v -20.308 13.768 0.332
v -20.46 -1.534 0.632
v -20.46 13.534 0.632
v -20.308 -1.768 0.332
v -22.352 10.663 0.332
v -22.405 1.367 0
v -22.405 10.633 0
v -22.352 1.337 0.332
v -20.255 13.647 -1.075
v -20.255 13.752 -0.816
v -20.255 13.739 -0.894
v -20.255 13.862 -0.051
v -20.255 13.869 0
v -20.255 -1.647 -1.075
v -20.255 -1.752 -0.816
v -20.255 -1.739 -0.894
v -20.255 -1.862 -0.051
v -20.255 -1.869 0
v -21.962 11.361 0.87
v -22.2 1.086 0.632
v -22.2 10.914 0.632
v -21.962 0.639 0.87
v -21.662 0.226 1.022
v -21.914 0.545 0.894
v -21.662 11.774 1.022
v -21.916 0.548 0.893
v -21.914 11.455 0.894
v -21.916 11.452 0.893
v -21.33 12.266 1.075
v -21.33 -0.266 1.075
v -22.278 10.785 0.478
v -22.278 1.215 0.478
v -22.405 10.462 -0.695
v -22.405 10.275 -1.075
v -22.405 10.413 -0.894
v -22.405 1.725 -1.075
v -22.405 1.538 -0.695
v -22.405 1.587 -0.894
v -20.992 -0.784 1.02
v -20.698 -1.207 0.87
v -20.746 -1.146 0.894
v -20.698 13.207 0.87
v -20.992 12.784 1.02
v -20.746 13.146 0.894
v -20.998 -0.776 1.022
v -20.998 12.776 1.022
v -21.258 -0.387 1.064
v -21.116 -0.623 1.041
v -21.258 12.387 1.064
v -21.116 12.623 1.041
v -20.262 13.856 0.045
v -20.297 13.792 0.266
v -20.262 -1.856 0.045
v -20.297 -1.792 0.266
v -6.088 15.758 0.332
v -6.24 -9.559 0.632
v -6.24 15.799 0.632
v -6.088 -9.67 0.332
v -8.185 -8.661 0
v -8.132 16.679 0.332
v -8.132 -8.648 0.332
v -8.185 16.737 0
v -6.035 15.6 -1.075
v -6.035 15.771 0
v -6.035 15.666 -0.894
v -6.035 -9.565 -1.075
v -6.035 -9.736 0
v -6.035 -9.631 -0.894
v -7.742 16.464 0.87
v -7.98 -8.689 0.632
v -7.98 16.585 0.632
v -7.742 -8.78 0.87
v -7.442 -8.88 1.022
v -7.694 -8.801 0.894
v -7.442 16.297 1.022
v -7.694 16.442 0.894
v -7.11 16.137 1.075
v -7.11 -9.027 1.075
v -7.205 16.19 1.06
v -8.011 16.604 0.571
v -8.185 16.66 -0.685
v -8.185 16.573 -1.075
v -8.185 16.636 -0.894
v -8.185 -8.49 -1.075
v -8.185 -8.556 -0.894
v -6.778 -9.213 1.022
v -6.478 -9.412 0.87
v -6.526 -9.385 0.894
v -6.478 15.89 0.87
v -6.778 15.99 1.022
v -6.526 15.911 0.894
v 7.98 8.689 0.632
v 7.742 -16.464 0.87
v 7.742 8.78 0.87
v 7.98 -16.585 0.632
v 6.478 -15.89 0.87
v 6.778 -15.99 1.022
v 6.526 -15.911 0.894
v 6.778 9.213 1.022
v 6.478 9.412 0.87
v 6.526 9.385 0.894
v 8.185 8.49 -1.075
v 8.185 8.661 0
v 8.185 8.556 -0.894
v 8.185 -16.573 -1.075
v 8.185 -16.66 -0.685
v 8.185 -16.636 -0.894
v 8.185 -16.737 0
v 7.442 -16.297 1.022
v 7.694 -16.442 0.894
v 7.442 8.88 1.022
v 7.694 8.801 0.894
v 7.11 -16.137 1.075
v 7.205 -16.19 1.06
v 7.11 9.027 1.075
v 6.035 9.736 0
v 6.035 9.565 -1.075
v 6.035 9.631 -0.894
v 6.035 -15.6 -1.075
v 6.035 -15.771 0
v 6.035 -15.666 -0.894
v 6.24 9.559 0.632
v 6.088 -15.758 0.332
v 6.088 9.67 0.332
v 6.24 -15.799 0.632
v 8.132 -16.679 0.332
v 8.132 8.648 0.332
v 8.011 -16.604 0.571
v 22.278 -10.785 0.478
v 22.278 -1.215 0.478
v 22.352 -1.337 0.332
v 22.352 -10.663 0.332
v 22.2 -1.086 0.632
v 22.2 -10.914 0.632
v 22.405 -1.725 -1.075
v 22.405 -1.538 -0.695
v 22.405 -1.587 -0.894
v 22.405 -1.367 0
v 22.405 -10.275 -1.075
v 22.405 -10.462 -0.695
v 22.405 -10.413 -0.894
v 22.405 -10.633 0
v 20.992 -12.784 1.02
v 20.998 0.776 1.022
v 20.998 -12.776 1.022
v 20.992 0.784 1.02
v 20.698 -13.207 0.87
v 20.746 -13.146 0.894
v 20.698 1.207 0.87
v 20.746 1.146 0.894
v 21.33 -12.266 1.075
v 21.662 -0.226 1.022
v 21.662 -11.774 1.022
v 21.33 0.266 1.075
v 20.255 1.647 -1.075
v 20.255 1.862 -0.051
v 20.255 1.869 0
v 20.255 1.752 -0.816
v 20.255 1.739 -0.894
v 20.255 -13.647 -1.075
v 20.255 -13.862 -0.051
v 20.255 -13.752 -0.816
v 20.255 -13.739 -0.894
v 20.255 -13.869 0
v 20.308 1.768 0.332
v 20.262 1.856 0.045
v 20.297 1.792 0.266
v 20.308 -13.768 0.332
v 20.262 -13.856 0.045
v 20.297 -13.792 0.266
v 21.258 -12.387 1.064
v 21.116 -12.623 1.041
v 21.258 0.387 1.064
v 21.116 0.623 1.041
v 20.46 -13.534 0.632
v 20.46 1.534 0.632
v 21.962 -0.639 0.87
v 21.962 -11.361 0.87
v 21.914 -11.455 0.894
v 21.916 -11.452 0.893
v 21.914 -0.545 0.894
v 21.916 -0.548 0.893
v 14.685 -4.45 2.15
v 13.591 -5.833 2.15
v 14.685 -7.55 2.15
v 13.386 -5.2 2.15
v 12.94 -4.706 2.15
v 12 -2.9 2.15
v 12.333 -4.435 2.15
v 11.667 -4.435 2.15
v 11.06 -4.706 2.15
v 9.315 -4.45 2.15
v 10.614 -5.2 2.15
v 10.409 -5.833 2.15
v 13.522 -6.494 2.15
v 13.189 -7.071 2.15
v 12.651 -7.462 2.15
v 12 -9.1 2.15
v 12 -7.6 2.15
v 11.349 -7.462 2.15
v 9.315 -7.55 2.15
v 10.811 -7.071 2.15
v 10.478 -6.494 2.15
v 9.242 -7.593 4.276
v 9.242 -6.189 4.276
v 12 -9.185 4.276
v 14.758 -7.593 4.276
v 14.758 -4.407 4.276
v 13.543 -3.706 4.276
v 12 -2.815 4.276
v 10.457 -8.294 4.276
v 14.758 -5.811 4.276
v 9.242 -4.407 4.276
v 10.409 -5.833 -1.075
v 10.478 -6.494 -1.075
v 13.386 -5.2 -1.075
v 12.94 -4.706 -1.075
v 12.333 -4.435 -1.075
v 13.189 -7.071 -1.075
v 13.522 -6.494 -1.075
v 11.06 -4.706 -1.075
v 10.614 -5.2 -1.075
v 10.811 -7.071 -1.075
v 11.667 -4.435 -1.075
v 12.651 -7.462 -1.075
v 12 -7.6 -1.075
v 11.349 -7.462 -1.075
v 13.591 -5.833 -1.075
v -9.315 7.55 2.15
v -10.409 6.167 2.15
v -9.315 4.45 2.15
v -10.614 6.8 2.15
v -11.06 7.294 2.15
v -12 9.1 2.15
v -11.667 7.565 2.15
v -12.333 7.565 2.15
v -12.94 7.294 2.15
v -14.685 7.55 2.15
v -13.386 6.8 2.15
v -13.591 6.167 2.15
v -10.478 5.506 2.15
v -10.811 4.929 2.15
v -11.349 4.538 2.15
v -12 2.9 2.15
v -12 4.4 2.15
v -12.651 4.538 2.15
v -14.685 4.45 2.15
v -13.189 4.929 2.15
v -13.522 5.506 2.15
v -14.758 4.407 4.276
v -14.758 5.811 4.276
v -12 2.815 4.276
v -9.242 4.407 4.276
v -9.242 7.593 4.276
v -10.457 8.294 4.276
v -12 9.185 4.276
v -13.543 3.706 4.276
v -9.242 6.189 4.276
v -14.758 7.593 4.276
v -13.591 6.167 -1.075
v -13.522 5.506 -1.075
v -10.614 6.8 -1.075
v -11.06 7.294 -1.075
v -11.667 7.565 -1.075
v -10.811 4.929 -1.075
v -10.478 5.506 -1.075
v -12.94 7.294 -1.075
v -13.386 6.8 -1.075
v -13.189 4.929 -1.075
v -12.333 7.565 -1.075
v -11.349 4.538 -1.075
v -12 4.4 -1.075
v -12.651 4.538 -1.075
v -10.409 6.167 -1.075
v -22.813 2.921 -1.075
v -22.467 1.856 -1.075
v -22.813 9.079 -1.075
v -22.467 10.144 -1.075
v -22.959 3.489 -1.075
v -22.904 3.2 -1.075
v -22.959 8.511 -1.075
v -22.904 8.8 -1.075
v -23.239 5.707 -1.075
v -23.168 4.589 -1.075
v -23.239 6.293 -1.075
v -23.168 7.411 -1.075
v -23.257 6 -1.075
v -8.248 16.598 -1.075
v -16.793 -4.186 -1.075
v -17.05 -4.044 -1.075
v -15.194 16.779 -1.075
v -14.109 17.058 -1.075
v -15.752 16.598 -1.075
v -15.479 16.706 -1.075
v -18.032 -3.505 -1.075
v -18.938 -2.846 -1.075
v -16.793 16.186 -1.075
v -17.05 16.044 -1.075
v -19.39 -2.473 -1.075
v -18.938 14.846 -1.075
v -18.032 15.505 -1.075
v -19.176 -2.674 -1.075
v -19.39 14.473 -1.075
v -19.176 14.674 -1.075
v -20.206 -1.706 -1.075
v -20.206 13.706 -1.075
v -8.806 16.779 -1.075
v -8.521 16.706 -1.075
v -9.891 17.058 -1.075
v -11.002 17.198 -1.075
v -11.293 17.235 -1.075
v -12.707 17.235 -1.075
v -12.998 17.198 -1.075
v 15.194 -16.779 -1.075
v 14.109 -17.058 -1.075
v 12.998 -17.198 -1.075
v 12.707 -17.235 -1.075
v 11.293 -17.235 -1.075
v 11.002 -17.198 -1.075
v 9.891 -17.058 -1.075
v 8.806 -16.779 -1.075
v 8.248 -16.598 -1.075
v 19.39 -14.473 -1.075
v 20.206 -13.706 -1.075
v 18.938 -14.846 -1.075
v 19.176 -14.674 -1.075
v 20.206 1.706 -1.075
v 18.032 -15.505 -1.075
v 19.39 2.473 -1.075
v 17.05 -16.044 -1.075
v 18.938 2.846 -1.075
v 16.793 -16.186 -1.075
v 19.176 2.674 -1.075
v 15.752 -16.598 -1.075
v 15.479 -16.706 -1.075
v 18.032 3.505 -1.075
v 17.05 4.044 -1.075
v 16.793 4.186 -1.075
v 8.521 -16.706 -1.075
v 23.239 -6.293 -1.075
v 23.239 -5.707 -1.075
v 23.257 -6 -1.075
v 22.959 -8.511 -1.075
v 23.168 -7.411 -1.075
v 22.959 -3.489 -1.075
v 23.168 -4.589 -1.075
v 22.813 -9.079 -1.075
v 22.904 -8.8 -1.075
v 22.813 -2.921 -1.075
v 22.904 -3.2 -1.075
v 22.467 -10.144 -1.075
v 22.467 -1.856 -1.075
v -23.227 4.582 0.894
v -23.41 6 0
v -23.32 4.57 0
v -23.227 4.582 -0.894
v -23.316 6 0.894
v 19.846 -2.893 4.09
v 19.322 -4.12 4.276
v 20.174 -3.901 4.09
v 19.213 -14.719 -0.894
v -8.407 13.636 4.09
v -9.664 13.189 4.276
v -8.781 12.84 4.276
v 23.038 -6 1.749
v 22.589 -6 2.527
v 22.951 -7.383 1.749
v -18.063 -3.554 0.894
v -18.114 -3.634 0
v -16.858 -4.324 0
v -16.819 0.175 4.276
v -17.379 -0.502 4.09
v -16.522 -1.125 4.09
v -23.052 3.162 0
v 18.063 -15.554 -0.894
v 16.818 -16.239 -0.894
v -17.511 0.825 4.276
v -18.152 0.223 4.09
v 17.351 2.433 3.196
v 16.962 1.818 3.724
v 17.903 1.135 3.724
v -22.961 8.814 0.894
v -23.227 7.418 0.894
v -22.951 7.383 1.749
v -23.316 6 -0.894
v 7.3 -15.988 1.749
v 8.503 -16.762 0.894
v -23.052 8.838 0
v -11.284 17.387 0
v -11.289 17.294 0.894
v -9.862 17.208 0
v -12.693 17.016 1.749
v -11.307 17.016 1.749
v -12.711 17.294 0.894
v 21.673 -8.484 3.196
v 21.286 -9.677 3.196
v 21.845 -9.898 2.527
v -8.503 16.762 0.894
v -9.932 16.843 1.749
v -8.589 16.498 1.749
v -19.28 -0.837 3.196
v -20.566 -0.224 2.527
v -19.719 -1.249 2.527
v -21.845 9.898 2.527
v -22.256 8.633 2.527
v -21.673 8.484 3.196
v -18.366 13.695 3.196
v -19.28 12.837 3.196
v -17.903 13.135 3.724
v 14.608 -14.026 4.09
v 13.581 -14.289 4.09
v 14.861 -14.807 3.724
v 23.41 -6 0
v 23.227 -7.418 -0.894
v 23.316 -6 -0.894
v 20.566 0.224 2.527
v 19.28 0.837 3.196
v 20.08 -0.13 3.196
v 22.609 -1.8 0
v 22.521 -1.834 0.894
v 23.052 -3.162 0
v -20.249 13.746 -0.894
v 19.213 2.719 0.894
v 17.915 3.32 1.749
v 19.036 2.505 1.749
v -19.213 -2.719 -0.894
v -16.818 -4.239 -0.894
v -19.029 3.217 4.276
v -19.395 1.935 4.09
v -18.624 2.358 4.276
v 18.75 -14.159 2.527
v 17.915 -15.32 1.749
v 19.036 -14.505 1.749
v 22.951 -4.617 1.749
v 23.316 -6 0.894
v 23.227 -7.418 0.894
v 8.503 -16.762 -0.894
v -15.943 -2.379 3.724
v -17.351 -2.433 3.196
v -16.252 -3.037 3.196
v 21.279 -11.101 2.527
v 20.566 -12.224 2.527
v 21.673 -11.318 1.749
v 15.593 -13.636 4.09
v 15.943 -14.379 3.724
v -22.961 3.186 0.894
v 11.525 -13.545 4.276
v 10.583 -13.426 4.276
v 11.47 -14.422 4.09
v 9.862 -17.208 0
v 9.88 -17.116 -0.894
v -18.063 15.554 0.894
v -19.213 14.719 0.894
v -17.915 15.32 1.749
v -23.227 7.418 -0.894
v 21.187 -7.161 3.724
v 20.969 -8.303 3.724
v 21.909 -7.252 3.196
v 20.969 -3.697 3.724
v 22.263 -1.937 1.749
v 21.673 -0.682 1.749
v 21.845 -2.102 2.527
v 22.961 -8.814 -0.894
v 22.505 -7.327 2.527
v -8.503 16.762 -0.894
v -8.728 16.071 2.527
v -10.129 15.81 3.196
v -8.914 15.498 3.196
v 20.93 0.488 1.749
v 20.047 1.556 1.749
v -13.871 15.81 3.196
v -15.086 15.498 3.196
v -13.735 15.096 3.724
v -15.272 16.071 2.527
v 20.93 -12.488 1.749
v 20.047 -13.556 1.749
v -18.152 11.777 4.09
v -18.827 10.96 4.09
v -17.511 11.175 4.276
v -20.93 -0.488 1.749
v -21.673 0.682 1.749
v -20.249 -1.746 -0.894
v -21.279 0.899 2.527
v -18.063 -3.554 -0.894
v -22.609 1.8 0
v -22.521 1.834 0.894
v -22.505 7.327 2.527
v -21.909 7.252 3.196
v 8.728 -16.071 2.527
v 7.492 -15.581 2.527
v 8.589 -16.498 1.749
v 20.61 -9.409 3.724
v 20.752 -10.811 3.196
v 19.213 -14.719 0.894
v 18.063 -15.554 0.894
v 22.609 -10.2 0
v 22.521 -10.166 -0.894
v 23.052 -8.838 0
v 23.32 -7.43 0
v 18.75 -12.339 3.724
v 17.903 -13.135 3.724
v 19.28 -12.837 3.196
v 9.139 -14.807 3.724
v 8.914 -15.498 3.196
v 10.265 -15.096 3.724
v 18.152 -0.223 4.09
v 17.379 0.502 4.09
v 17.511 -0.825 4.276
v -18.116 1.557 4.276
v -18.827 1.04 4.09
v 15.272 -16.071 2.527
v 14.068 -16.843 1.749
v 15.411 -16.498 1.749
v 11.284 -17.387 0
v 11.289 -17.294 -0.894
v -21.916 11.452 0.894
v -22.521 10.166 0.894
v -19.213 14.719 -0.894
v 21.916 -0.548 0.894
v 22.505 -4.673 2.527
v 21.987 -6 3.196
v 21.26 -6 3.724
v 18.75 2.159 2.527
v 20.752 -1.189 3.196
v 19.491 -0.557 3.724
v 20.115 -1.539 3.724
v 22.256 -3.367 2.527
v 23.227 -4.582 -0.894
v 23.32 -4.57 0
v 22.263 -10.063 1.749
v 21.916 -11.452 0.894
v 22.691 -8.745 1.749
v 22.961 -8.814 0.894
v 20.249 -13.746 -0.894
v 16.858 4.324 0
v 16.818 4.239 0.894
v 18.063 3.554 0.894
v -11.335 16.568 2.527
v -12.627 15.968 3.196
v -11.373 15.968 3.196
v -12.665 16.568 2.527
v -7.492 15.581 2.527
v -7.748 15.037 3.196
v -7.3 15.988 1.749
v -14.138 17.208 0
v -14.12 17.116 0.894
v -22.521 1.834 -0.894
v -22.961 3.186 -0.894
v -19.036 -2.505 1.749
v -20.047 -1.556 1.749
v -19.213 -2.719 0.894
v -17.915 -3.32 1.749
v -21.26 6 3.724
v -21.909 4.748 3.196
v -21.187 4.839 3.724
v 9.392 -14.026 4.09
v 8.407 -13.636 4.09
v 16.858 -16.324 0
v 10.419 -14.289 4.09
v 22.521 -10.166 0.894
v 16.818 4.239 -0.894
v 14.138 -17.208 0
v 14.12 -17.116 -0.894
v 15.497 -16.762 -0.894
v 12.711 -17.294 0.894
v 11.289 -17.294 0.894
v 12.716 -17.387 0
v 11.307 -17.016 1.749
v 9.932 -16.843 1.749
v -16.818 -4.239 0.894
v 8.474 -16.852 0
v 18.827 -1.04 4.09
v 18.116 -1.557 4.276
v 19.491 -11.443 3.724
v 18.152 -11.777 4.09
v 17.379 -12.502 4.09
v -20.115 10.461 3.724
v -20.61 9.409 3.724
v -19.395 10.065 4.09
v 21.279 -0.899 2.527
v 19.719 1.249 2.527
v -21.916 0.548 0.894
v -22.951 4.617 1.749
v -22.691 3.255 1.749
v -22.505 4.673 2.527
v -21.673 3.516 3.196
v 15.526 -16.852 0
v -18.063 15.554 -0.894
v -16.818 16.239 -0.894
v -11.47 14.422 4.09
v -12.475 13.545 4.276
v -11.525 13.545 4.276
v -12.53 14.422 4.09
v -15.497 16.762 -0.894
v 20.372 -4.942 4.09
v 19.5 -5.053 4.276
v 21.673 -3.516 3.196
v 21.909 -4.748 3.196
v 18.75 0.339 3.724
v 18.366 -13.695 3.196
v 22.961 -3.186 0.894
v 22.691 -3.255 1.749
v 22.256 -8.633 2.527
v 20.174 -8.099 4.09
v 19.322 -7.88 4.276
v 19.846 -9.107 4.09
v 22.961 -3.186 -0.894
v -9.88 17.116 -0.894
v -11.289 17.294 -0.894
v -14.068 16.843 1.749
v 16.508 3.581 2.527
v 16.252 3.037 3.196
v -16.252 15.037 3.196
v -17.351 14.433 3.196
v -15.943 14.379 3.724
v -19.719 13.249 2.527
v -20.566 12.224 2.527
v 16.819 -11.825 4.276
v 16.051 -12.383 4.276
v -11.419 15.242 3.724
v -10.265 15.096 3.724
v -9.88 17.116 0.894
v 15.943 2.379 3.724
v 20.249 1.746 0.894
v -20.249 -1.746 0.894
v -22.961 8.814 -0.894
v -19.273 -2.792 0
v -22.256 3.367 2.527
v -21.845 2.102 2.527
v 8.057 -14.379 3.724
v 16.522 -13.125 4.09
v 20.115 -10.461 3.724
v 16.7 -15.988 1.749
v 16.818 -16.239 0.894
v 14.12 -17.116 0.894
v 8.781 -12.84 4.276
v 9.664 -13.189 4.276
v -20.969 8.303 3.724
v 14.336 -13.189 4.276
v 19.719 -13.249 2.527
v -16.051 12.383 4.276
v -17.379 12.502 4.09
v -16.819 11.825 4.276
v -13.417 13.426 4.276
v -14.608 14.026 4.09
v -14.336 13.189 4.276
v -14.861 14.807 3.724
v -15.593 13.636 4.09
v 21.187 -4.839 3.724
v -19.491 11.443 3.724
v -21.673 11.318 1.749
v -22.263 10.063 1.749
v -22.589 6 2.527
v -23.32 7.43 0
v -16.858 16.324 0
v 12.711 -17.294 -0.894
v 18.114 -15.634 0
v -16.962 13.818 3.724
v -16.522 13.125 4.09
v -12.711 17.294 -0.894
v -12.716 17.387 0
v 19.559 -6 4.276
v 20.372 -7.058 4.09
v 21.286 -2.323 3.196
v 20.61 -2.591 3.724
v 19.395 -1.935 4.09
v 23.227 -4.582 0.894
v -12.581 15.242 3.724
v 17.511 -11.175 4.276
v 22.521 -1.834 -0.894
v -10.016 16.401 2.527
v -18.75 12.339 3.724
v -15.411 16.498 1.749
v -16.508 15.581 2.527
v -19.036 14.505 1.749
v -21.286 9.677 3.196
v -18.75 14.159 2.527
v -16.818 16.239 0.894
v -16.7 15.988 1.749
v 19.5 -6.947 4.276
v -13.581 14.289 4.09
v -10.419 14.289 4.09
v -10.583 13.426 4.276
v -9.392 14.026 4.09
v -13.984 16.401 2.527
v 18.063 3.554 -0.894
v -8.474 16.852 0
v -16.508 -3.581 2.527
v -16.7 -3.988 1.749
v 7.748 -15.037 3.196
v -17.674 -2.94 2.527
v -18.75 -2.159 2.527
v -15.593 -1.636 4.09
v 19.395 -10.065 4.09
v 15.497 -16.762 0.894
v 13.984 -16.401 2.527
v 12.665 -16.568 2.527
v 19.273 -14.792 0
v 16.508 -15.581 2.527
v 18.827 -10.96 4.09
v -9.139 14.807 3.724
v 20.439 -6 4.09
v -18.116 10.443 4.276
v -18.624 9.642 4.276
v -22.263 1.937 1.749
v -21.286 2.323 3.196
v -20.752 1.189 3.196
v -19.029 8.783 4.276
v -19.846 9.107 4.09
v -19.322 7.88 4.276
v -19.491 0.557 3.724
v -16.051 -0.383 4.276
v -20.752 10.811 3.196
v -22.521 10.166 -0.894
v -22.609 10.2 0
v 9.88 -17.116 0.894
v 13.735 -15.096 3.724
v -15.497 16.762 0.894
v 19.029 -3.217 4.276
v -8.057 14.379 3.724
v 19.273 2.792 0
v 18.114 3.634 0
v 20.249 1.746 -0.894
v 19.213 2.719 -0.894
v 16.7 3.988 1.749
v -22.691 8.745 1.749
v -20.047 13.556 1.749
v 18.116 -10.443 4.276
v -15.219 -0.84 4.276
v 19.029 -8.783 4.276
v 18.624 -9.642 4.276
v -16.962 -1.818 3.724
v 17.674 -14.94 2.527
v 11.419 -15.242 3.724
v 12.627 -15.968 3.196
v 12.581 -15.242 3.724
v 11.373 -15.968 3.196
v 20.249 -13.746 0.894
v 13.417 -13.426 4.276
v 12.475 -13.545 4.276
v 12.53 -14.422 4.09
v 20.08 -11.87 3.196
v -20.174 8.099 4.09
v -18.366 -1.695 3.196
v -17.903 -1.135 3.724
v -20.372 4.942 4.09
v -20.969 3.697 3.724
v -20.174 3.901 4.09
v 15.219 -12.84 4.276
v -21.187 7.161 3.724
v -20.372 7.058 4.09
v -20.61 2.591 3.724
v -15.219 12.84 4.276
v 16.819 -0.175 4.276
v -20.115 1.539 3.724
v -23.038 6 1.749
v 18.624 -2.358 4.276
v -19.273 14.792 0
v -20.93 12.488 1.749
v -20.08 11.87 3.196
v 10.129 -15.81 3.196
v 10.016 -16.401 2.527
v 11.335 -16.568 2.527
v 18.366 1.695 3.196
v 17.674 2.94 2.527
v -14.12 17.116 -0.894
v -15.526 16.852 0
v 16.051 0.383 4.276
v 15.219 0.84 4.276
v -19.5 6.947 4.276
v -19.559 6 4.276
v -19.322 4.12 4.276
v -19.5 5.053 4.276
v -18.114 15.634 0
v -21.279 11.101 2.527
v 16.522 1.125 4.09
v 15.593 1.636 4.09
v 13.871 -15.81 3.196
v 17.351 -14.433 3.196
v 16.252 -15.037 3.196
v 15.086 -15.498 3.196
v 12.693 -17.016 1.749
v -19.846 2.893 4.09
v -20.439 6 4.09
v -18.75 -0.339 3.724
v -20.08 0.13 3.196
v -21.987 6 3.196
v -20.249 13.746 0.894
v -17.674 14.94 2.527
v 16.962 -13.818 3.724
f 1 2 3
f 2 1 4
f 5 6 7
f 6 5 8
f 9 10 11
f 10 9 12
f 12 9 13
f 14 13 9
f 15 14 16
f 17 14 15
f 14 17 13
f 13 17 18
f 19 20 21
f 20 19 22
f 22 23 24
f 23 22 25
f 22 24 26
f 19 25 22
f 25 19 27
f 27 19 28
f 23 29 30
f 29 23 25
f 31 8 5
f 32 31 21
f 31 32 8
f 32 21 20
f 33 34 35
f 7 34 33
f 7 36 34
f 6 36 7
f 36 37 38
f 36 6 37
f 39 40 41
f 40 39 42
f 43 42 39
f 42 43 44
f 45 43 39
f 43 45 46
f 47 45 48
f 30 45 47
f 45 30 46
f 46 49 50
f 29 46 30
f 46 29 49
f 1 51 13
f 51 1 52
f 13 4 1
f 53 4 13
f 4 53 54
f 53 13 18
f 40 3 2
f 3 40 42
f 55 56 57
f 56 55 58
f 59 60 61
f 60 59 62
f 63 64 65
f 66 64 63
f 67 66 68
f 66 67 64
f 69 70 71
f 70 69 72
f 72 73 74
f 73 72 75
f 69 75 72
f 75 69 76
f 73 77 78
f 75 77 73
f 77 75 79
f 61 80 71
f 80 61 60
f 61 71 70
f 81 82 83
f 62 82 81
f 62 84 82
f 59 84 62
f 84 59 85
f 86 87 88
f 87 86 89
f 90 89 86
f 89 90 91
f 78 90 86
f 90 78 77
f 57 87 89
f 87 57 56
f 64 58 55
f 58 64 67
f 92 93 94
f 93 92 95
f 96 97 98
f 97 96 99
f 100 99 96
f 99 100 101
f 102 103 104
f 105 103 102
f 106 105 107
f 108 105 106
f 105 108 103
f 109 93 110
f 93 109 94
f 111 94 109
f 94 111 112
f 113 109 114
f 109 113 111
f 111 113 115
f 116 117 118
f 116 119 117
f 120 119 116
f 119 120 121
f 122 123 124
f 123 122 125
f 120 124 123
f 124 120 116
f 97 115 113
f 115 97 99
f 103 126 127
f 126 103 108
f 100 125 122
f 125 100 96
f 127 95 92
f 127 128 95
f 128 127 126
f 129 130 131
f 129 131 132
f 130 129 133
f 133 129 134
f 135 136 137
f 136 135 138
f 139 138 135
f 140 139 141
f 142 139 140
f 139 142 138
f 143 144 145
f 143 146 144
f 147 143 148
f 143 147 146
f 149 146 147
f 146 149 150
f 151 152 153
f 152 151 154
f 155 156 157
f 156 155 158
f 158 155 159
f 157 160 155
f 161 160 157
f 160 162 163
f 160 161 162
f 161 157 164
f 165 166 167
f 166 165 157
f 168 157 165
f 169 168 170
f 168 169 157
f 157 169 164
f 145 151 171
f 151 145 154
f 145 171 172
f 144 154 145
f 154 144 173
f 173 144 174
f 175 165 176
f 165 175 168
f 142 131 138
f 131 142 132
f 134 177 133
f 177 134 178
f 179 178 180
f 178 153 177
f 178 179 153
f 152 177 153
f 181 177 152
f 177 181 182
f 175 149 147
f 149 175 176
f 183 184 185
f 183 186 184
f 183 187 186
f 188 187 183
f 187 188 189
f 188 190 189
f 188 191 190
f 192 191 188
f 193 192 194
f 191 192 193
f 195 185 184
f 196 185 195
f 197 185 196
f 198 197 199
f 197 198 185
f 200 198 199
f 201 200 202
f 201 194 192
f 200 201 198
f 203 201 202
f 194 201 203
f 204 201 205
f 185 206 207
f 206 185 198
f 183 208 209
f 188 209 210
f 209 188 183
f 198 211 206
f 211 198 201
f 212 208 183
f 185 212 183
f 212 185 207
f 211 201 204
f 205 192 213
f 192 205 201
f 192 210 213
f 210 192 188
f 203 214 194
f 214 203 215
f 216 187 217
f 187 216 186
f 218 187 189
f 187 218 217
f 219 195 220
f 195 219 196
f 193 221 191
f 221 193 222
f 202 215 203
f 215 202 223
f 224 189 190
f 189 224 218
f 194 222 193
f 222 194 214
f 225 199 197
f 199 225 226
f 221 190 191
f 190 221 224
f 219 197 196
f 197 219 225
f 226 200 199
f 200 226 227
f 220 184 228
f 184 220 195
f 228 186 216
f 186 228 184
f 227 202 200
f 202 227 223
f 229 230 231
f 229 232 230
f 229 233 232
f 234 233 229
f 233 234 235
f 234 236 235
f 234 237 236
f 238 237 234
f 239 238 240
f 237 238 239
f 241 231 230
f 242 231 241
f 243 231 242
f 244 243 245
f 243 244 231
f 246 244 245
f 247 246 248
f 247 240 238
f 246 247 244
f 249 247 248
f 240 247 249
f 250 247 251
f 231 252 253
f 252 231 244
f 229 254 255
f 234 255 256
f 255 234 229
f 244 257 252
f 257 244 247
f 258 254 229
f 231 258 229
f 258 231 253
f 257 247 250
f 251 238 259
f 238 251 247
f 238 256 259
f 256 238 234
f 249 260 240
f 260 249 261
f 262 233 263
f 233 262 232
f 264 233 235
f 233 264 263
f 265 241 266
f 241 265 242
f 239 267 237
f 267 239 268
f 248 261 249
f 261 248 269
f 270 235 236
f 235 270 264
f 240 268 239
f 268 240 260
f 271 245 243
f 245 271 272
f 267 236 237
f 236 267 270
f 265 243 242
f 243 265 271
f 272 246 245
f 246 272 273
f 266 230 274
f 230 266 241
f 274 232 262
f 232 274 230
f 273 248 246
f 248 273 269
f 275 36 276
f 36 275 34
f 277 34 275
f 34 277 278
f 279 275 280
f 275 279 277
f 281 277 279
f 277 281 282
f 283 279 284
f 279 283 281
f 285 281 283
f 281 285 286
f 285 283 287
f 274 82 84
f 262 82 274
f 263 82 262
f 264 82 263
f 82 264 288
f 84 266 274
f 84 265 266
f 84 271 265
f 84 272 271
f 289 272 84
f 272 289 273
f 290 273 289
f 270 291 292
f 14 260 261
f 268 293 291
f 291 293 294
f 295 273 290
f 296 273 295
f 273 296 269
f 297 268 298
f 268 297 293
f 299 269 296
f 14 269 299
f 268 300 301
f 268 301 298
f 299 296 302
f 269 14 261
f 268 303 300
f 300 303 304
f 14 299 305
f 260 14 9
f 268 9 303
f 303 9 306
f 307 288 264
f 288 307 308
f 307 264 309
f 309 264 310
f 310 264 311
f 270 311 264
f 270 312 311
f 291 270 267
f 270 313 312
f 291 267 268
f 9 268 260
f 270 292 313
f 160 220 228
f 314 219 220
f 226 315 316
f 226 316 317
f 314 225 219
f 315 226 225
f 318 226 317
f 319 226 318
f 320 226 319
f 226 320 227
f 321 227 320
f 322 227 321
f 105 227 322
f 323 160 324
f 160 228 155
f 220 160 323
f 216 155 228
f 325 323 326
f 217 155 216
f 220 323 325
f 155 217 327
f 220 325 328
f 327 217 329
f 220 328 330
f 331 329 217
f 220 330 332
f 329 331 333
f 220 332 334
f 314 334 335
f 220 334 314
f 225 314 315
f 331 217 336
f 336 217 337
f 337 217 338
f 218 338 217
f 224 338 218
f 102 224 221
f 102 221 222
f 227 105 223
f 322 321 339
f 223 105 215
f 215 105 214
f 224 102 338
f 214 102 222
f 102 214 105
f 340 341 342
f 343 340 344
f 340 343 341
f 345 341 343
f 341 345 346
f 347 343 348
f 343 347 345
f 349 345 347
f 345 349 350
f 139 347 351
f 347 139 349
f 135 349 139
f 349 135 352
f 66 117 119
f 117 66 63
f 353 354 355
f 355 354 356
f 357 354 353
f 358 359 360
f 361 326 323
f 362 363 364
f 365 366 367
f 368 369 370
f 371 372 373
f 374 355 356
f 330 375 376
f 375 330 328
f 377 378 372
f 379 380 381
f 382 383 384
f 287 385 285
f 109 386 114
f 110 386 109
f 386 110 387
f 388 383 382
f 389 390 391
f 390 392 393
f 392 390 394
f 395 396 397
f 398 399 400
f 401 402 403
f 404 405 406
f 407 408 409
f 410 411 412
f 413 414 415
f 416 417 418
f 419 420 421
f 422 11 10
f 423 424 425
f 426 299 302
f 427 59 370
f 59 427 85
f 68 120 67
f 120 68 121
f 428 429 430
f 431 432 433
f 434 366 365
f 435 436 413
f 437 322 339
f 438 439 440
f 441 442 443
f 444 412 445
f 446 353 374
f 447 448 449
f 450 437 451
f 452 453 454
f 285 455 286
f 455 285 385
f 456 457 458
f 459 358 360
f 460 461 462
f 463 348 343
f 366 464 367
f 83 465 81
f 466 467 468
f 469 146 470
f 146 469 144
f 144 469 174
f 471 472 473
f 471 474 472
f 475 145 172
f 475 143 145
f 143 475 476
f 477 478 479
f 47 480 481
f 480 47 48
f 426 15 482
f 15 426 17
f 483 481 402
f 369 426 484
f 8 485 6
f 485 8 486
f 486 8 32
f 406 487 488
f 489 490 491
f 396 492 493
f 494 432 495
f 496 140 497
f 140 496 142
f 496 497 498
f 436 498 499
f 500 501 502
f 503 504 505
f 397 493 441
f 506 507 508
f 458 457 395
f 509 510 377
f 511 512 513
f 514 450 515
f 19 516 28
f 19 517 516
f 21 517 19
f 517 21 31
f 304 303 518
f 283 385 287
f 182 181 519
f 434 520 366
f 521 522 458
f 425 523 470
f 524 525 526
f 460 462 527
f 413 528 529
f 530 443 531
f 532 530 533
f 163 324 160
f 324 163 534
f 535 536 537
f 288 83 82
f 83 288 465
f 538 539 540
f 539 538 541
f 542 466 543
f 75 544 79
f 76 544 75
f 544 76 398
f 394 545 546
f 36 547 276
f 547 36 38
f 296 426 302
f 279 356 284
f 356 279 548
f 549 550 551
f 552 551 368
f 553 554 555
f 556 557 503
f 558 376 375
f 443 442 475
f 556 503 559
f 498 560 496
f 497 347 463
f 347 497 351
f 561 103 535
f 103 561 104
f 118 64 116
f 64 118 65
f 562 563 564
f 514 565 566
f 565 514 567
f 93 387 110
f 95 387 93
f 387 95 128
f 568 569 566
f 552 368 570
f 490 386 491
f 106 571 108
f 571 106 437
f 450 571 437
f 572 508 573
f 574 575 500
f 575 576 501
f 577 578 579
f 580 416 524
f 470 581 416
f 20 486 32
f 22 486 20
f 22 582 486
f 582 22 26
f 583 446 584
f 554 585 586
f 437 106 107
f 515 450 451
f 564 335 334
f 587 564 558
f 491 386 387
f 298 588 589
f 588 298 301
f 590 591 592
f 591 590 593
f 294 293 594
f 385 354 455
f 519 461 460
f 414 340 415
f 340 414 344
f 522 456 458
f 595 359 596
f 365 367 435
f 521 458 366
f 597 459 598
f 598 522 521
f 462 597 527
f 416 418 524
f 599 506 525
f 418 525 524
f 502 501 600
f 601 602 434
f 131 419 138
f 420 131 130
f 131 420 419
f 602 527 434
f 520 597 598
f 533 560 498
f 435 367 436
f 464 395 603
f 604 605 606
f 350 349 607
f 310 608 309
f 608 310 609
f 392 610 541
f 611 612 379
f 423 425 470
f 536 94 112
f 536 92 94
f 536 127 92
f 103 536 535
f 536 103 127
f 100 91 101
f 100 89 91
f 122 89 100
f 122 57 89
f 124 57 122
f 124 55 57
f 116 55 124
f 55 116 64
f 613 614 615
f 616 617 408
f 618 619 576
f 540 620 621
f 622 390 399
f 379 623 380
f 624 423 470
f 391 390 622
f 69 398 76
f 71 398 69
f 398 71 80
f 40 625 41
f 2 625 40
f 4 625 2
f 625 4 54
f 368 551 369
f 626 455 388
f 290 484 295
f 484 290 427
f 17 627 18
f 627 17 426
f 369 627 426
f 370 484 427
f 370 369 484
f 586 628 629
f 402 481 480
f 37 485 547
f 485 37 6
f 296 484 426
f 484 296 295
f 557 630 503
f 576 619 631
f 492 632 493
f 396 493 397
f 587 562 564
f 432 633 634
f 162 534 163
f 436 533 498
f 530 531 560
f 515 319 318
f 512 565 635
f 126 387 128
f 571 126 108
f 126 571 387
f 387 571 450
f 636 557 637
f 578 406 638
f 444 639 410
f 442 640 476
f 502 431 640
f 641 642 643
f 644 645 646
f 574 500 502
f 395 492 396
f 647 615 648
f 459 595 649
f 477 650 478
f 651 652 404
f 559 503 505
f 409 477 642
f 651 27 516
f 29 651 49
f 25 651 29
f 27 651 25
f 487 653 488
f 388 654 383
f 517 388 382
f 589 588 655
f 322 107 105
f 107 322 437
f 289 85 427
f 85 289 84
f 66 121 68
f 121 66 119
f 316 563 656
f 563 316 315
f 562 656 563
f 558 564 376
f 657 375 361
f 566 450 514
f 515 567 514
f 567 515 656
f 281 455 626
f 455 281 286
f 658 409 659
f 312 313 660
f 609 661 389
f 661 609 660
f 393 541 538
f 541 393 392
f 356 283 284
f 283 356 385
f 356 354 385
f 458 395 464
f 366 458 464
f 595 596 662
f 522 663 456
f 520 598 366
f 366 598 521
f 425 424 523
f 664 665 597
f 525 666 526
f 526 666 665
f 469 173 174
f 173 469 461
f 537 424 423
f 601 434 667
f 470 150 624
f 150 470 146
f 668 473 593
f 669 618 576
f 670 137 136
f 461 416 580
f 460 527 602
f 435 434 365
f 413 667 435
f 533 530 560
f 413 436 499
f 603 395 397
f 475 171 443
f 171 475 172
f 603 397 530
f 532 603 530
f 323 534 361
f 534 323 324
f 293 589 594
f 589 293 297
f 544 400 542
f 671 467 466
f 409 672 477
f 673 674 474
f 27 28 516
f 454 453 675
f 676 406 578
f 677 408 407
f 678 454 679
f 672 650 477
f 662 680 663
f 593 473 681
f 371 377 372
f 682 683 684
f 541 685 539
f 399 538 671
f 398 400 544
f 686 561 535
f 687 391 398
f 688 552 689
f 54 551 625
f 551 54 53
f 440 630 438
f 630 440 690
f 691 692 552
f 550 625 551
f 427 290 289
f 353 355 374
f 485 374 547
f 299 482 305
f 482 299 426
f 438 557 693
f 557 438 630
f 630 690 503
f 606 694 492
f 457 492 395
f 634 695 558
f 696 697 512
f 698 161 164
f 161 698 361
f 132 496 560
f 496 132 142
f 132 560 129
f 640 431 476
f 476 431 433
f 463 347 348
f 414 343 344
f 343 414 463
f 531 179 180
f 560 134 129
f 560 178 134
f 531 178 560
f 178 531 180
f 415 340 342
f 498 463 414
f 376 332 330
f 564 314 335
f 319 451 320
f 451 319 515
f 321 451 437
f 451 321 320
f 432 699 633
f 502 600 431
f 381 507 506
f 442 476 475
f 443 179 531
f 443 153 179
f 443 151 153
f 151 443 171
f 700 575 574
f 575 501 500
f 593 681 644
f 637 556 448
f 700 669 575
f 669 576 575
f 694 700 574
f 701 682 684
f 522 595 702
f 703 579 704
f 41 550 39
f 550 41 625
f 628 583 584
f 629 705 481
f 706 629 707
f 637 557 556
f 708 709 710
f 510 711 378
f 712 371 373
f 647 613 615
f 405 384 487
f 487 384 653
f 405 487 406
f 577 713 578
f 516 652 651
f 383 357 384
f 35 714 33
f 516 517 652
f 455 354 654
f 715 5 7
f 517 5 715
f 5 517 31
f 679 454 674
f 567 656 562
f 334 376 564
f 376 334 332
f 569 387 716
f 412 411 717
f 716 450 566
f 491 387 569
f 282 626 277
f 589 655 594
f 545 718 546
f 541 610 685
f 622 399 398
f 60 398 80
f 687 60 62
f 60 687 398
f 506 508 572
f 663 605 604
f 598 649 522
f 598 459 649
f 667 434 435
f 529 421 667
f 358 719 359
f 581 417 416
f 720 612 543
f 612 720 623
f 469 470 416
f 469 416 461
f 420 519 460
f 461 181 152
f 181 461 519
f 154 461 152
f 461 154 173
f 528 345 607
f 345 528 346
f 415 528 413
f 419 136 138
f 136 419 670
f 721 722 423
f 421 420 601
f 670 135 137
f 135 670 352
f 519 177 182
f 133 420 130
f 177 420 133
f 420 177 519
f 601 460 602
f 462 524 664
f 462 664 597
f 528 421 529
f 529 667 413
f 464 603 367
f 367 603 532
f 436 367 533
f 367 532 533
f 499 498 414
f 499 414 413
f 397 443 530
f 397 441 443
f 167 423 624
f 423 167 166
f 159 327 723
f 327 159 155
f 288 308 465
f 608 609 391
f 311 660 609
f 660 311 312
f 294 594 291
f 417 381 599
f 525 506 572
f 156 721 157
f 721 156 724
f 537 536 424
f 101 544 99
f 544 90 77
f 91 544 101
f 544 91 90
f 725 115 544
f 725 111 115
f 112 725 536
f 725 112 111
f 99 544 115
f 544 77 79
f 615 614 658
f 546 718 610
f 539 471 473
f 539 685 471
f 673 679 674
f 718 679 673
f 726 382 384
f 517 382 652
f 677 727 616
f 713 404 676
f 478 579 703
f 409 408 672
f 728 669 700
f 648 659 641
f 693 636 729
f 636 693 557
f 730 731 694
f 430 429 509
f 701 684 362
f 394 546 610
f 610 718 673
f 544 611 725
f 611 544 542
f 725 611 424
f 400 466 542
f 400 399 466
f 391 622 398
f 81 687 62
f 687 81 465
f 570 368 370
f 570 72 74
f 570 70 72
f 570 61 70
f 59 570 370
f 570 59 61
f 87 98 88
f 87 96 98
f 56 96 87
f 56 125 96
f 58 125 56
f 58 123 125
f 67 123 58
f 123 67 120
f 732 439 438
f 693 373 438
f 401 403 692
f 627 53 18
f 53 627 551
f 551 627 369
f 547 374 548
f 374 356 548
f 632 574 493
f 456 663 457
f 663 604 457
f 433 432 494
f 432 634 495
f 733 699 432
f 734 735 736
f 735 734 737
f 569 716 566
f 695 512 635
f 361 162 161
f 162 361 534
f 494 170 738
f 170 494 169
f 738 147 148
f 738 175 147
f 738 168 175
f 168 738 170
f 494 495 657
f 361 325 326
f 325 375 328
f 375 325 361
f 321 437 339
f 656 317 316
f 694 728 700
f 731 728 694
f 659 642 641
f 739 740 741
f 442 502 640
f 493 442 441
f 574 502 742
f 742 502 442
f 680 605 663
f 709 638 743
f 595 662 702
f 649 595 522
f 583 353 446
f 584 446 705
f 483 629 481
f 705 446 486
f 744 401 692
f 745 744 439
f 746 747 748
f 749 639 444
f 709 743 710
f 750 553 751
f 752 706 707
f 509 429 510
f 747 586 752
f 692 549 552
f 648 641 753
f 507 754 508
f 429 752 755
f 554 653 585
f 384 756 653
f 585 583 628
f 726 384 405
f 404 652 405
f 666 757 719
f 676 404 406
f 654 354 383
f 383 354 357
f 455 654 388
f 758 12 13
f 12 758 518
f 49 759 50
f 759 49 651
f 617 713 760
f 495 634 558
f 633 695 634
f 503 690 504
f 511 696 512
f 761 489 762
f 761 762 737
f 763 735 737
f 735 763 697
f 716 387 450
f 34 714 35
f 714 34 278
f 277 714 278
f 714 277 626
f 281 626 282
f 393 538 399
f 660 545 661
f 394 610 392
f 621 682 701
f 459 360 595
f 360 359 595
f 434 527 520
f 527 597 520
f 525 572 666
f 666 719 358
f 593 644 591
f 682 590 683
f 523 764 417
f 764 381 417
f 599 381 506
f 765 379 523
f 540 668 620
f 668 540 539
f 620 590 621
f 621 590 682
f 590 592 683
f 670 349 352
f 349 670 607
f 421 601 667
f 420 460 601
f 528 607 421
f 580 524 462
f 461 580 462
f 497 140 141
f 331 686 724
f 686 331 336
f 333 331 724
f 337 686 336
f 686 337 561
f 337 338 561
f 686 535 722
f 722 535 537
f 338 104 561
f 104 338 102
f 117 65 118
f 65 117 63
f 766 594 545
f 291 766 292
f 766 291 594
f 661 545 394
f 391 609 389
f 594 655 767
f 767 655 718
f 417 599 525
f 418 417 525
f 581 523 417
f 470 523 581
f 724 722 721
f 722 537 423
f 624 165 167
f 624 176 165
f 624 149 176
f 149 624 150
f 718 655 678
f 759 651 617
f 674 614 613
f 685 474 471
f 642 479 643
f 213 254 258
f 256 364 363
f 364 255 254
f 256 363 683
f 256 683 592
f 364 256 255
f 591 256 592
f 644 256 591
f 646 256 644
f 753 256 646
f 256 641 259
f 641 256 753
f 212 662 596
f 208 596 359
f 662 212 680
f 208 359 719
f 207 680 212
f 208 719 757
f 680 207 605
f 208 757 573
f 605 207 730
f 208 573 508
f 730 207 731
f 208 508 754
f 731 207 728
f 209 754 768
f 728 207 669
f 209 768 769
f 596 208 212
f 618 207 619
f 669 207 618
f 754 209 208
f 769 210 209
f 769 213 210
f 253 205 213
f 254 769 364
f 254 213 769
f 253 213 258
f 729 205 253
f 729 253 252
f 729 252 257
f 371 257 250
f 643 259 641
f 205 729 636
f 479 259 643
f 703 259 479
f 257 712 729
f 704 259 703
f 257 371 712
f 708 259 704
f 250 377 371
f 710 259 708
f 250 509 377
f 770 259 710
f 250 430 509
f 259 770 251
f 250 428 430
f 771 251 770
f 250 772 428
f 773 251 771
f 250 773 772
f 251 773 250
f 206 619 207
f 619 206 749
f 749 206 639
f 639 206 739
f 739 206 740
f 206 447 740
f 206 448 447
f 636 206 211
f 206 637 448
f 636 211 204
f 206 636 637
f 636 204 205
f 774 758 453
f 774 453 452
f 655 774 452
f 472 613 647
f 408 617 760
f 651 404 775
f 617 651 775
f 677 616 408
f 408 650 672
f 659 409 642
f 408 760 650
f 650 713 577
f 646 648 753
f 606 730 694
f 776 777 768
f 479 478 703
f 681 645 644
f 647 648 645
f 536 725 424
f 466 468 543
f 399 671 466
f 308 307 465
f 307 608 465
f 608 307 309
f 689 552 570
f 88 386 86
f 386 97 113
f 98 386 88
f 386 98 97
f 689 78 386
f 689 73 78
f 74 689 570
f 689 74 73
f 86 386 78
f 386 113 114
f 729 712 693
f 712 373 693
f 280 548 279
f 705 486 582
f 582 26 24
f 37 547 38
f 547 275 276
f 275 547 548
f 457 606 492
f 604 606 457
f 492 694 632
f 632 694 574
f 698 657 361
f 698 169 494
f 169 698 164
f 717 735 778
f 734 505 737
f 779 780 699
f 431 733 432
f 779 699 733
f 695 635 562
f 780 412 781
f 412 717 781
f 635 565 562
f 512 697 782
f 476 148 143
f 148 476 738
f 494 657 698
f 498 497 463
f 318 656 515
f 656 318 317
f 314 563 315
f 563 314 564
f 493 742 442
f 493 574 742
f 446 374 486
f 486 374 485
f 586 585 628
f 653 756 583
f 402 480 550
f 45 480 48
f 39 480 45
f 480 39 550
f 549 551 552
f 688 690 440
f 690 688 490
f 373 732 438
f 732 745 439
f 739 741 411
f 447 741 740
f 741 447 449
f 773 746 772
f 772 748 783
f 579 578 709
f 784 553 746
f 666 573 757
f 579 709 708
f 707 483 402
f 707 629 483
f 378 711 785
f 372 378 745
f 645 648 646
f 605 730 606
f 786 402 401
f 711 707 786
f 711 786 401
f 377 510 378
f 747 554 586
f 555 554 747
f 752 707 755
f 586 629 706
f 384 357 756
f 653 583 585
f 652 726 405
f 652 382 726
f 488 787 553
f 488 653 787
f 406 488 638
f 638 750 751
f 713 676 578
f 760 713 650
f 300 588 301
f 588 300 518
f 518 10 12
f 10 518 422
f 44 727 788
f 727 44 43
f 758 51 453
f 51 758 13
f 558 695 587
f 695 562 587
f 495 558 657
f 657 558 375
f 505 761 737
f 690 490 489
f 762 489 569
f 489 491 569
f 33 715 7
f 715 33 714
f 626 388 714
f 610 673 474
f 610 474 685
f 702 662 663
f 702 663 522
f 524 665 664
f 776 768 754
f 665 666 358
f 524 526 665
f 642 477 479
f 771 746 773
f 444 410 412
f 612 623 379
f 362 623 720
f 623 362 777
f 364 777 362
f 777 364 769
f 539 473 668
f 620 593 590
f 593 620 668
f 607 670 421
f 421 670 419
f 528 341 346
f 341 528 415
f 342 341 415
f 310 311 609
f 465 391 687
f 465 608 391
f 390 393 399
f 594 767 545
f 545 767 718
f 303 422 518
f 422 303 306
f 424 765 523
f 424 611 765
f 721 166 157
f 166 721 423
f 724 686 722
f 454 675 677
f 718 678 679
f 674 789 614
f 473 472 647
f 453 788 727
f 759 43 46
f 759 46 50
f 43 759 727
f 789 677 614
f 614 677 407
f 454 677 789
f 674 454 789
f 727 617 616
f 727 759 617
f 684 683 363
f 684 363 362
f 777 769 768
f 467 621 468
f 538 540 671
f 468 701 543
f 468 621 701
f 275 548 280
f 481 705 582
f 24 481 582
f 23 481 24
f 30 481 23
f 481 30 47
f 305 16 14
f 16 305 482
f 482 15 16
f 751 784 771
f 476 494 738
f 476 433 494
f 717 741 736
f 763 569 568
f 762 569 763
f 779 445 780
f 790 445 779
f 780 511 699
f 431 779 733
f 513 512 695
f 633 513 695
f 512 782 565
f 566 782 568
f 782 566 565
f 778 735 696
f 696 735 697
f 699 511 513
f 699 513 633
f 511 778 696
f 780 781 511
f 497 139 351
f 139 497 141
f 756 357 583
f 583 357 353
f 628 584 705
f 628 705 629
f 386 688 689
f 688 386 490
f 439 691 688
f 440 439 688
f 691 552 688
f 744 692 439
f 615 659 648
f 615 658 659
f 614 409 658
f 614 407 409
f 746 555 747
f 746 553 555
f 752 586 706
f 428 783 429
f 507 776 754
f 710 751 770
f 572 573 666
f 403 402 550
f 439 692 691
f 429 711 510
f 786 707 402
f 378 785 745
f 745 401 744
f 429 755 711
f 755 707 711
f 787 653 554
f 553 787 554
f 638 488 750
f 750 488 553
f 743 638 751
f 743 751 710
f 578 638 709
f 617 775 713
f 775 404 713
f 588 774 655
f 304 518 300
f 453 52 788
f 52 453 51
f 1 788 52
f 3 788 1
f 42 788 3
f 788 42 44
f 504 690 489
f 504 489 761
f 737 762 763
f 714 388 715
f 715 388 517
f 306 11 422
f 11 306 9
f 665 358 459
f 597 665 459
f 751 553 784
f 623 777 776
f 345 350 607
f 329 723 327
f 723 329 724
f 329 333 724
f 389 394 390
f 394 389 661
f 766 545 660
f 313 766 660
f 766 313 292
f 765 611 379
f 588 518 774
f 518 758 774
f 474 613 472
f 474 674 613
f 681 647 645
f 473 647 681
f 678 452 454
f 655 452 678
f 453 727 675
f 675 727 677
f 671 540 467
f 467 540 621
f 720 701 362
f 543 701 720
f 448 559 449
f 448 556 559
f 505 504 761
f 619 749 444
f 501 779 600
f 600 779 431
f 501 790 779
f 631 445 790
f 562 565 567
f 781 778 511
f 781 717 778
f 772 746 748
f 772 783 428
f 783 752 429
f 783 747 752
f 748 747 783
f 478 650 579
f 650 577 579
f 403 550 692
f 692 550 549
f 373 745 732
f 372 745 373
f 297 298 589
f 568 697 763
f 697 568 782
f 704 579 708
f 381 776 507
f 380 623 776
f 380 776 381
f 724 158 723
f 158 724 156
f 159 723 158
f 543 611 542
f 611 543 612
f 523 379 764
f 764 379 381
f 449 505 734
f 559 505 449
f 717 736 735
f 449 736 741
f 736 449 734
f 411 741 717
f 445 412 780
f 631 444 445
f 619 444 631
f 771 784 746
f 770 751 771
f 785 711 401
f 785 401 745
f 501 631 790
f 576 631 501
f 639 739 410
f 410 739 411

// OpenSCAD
// file: M3.scad
module M3_spacer() {
    union(){
        cylinder( 5, 3.1, 3.3, false, $fn = 6);
        translate([0, 0, -4.9])cylinder(  10, 1.6, 1.6, true, $fn = 15);
    };
}

/*
difference(){
    cube([9,9,6],true);
    M3_spacer ();
}
*/

//M3_spacer();
// main file
include <M3.scad>

thickness = 2.15;
distance = 14.22;

x = 24;
y = -12;

difference(){
    hull(){
    translate ([x/2, y/2, 0])
        rotate_extrude(convexity = 10, $fn = 50)
            translate([distance * 0.5, 0, 0])
                circle(r = thickness * 2, $fn = 30);
    translate ([-x/2, -y/2, 0])
        rotate_extrude(convexity = 10, $fn = 50)
            translate([distance * 0.5, 0, 0])
                circle(r = thickness * 2, $fn = 30);
    }
    union(){
        for (i = [-distance* 1.5, -distance/2, distance/2, distance* 1.5])
            translate ([i, 0, 0]) 
                hull(){
                    rotate ([90, 0, 0])
                    cylinder (distance*3, thickness/2, thickness/2, true, $fn = 20);
                    translate([0, 0, -thickness * 2])rotate ([90, 0, 0])
                    cylinder (distance*4, thickness/2, thickness/2, true, $fn = 20);
                }
        translate ([0, 0, -distance - thickness/2]) cylinder (distance * 2, distance*5, distance*5, true);   
        translate ([x/2, y/2, 0])
            translate([0, 0, thickness])rotate ([0, 0, 30])M3_spacer();      
        translate ([-x/2, -y/2, 0])
            translate([0, 0, thickness])rotate ([0, 0, 30])M3_spacer();  
    }
}
